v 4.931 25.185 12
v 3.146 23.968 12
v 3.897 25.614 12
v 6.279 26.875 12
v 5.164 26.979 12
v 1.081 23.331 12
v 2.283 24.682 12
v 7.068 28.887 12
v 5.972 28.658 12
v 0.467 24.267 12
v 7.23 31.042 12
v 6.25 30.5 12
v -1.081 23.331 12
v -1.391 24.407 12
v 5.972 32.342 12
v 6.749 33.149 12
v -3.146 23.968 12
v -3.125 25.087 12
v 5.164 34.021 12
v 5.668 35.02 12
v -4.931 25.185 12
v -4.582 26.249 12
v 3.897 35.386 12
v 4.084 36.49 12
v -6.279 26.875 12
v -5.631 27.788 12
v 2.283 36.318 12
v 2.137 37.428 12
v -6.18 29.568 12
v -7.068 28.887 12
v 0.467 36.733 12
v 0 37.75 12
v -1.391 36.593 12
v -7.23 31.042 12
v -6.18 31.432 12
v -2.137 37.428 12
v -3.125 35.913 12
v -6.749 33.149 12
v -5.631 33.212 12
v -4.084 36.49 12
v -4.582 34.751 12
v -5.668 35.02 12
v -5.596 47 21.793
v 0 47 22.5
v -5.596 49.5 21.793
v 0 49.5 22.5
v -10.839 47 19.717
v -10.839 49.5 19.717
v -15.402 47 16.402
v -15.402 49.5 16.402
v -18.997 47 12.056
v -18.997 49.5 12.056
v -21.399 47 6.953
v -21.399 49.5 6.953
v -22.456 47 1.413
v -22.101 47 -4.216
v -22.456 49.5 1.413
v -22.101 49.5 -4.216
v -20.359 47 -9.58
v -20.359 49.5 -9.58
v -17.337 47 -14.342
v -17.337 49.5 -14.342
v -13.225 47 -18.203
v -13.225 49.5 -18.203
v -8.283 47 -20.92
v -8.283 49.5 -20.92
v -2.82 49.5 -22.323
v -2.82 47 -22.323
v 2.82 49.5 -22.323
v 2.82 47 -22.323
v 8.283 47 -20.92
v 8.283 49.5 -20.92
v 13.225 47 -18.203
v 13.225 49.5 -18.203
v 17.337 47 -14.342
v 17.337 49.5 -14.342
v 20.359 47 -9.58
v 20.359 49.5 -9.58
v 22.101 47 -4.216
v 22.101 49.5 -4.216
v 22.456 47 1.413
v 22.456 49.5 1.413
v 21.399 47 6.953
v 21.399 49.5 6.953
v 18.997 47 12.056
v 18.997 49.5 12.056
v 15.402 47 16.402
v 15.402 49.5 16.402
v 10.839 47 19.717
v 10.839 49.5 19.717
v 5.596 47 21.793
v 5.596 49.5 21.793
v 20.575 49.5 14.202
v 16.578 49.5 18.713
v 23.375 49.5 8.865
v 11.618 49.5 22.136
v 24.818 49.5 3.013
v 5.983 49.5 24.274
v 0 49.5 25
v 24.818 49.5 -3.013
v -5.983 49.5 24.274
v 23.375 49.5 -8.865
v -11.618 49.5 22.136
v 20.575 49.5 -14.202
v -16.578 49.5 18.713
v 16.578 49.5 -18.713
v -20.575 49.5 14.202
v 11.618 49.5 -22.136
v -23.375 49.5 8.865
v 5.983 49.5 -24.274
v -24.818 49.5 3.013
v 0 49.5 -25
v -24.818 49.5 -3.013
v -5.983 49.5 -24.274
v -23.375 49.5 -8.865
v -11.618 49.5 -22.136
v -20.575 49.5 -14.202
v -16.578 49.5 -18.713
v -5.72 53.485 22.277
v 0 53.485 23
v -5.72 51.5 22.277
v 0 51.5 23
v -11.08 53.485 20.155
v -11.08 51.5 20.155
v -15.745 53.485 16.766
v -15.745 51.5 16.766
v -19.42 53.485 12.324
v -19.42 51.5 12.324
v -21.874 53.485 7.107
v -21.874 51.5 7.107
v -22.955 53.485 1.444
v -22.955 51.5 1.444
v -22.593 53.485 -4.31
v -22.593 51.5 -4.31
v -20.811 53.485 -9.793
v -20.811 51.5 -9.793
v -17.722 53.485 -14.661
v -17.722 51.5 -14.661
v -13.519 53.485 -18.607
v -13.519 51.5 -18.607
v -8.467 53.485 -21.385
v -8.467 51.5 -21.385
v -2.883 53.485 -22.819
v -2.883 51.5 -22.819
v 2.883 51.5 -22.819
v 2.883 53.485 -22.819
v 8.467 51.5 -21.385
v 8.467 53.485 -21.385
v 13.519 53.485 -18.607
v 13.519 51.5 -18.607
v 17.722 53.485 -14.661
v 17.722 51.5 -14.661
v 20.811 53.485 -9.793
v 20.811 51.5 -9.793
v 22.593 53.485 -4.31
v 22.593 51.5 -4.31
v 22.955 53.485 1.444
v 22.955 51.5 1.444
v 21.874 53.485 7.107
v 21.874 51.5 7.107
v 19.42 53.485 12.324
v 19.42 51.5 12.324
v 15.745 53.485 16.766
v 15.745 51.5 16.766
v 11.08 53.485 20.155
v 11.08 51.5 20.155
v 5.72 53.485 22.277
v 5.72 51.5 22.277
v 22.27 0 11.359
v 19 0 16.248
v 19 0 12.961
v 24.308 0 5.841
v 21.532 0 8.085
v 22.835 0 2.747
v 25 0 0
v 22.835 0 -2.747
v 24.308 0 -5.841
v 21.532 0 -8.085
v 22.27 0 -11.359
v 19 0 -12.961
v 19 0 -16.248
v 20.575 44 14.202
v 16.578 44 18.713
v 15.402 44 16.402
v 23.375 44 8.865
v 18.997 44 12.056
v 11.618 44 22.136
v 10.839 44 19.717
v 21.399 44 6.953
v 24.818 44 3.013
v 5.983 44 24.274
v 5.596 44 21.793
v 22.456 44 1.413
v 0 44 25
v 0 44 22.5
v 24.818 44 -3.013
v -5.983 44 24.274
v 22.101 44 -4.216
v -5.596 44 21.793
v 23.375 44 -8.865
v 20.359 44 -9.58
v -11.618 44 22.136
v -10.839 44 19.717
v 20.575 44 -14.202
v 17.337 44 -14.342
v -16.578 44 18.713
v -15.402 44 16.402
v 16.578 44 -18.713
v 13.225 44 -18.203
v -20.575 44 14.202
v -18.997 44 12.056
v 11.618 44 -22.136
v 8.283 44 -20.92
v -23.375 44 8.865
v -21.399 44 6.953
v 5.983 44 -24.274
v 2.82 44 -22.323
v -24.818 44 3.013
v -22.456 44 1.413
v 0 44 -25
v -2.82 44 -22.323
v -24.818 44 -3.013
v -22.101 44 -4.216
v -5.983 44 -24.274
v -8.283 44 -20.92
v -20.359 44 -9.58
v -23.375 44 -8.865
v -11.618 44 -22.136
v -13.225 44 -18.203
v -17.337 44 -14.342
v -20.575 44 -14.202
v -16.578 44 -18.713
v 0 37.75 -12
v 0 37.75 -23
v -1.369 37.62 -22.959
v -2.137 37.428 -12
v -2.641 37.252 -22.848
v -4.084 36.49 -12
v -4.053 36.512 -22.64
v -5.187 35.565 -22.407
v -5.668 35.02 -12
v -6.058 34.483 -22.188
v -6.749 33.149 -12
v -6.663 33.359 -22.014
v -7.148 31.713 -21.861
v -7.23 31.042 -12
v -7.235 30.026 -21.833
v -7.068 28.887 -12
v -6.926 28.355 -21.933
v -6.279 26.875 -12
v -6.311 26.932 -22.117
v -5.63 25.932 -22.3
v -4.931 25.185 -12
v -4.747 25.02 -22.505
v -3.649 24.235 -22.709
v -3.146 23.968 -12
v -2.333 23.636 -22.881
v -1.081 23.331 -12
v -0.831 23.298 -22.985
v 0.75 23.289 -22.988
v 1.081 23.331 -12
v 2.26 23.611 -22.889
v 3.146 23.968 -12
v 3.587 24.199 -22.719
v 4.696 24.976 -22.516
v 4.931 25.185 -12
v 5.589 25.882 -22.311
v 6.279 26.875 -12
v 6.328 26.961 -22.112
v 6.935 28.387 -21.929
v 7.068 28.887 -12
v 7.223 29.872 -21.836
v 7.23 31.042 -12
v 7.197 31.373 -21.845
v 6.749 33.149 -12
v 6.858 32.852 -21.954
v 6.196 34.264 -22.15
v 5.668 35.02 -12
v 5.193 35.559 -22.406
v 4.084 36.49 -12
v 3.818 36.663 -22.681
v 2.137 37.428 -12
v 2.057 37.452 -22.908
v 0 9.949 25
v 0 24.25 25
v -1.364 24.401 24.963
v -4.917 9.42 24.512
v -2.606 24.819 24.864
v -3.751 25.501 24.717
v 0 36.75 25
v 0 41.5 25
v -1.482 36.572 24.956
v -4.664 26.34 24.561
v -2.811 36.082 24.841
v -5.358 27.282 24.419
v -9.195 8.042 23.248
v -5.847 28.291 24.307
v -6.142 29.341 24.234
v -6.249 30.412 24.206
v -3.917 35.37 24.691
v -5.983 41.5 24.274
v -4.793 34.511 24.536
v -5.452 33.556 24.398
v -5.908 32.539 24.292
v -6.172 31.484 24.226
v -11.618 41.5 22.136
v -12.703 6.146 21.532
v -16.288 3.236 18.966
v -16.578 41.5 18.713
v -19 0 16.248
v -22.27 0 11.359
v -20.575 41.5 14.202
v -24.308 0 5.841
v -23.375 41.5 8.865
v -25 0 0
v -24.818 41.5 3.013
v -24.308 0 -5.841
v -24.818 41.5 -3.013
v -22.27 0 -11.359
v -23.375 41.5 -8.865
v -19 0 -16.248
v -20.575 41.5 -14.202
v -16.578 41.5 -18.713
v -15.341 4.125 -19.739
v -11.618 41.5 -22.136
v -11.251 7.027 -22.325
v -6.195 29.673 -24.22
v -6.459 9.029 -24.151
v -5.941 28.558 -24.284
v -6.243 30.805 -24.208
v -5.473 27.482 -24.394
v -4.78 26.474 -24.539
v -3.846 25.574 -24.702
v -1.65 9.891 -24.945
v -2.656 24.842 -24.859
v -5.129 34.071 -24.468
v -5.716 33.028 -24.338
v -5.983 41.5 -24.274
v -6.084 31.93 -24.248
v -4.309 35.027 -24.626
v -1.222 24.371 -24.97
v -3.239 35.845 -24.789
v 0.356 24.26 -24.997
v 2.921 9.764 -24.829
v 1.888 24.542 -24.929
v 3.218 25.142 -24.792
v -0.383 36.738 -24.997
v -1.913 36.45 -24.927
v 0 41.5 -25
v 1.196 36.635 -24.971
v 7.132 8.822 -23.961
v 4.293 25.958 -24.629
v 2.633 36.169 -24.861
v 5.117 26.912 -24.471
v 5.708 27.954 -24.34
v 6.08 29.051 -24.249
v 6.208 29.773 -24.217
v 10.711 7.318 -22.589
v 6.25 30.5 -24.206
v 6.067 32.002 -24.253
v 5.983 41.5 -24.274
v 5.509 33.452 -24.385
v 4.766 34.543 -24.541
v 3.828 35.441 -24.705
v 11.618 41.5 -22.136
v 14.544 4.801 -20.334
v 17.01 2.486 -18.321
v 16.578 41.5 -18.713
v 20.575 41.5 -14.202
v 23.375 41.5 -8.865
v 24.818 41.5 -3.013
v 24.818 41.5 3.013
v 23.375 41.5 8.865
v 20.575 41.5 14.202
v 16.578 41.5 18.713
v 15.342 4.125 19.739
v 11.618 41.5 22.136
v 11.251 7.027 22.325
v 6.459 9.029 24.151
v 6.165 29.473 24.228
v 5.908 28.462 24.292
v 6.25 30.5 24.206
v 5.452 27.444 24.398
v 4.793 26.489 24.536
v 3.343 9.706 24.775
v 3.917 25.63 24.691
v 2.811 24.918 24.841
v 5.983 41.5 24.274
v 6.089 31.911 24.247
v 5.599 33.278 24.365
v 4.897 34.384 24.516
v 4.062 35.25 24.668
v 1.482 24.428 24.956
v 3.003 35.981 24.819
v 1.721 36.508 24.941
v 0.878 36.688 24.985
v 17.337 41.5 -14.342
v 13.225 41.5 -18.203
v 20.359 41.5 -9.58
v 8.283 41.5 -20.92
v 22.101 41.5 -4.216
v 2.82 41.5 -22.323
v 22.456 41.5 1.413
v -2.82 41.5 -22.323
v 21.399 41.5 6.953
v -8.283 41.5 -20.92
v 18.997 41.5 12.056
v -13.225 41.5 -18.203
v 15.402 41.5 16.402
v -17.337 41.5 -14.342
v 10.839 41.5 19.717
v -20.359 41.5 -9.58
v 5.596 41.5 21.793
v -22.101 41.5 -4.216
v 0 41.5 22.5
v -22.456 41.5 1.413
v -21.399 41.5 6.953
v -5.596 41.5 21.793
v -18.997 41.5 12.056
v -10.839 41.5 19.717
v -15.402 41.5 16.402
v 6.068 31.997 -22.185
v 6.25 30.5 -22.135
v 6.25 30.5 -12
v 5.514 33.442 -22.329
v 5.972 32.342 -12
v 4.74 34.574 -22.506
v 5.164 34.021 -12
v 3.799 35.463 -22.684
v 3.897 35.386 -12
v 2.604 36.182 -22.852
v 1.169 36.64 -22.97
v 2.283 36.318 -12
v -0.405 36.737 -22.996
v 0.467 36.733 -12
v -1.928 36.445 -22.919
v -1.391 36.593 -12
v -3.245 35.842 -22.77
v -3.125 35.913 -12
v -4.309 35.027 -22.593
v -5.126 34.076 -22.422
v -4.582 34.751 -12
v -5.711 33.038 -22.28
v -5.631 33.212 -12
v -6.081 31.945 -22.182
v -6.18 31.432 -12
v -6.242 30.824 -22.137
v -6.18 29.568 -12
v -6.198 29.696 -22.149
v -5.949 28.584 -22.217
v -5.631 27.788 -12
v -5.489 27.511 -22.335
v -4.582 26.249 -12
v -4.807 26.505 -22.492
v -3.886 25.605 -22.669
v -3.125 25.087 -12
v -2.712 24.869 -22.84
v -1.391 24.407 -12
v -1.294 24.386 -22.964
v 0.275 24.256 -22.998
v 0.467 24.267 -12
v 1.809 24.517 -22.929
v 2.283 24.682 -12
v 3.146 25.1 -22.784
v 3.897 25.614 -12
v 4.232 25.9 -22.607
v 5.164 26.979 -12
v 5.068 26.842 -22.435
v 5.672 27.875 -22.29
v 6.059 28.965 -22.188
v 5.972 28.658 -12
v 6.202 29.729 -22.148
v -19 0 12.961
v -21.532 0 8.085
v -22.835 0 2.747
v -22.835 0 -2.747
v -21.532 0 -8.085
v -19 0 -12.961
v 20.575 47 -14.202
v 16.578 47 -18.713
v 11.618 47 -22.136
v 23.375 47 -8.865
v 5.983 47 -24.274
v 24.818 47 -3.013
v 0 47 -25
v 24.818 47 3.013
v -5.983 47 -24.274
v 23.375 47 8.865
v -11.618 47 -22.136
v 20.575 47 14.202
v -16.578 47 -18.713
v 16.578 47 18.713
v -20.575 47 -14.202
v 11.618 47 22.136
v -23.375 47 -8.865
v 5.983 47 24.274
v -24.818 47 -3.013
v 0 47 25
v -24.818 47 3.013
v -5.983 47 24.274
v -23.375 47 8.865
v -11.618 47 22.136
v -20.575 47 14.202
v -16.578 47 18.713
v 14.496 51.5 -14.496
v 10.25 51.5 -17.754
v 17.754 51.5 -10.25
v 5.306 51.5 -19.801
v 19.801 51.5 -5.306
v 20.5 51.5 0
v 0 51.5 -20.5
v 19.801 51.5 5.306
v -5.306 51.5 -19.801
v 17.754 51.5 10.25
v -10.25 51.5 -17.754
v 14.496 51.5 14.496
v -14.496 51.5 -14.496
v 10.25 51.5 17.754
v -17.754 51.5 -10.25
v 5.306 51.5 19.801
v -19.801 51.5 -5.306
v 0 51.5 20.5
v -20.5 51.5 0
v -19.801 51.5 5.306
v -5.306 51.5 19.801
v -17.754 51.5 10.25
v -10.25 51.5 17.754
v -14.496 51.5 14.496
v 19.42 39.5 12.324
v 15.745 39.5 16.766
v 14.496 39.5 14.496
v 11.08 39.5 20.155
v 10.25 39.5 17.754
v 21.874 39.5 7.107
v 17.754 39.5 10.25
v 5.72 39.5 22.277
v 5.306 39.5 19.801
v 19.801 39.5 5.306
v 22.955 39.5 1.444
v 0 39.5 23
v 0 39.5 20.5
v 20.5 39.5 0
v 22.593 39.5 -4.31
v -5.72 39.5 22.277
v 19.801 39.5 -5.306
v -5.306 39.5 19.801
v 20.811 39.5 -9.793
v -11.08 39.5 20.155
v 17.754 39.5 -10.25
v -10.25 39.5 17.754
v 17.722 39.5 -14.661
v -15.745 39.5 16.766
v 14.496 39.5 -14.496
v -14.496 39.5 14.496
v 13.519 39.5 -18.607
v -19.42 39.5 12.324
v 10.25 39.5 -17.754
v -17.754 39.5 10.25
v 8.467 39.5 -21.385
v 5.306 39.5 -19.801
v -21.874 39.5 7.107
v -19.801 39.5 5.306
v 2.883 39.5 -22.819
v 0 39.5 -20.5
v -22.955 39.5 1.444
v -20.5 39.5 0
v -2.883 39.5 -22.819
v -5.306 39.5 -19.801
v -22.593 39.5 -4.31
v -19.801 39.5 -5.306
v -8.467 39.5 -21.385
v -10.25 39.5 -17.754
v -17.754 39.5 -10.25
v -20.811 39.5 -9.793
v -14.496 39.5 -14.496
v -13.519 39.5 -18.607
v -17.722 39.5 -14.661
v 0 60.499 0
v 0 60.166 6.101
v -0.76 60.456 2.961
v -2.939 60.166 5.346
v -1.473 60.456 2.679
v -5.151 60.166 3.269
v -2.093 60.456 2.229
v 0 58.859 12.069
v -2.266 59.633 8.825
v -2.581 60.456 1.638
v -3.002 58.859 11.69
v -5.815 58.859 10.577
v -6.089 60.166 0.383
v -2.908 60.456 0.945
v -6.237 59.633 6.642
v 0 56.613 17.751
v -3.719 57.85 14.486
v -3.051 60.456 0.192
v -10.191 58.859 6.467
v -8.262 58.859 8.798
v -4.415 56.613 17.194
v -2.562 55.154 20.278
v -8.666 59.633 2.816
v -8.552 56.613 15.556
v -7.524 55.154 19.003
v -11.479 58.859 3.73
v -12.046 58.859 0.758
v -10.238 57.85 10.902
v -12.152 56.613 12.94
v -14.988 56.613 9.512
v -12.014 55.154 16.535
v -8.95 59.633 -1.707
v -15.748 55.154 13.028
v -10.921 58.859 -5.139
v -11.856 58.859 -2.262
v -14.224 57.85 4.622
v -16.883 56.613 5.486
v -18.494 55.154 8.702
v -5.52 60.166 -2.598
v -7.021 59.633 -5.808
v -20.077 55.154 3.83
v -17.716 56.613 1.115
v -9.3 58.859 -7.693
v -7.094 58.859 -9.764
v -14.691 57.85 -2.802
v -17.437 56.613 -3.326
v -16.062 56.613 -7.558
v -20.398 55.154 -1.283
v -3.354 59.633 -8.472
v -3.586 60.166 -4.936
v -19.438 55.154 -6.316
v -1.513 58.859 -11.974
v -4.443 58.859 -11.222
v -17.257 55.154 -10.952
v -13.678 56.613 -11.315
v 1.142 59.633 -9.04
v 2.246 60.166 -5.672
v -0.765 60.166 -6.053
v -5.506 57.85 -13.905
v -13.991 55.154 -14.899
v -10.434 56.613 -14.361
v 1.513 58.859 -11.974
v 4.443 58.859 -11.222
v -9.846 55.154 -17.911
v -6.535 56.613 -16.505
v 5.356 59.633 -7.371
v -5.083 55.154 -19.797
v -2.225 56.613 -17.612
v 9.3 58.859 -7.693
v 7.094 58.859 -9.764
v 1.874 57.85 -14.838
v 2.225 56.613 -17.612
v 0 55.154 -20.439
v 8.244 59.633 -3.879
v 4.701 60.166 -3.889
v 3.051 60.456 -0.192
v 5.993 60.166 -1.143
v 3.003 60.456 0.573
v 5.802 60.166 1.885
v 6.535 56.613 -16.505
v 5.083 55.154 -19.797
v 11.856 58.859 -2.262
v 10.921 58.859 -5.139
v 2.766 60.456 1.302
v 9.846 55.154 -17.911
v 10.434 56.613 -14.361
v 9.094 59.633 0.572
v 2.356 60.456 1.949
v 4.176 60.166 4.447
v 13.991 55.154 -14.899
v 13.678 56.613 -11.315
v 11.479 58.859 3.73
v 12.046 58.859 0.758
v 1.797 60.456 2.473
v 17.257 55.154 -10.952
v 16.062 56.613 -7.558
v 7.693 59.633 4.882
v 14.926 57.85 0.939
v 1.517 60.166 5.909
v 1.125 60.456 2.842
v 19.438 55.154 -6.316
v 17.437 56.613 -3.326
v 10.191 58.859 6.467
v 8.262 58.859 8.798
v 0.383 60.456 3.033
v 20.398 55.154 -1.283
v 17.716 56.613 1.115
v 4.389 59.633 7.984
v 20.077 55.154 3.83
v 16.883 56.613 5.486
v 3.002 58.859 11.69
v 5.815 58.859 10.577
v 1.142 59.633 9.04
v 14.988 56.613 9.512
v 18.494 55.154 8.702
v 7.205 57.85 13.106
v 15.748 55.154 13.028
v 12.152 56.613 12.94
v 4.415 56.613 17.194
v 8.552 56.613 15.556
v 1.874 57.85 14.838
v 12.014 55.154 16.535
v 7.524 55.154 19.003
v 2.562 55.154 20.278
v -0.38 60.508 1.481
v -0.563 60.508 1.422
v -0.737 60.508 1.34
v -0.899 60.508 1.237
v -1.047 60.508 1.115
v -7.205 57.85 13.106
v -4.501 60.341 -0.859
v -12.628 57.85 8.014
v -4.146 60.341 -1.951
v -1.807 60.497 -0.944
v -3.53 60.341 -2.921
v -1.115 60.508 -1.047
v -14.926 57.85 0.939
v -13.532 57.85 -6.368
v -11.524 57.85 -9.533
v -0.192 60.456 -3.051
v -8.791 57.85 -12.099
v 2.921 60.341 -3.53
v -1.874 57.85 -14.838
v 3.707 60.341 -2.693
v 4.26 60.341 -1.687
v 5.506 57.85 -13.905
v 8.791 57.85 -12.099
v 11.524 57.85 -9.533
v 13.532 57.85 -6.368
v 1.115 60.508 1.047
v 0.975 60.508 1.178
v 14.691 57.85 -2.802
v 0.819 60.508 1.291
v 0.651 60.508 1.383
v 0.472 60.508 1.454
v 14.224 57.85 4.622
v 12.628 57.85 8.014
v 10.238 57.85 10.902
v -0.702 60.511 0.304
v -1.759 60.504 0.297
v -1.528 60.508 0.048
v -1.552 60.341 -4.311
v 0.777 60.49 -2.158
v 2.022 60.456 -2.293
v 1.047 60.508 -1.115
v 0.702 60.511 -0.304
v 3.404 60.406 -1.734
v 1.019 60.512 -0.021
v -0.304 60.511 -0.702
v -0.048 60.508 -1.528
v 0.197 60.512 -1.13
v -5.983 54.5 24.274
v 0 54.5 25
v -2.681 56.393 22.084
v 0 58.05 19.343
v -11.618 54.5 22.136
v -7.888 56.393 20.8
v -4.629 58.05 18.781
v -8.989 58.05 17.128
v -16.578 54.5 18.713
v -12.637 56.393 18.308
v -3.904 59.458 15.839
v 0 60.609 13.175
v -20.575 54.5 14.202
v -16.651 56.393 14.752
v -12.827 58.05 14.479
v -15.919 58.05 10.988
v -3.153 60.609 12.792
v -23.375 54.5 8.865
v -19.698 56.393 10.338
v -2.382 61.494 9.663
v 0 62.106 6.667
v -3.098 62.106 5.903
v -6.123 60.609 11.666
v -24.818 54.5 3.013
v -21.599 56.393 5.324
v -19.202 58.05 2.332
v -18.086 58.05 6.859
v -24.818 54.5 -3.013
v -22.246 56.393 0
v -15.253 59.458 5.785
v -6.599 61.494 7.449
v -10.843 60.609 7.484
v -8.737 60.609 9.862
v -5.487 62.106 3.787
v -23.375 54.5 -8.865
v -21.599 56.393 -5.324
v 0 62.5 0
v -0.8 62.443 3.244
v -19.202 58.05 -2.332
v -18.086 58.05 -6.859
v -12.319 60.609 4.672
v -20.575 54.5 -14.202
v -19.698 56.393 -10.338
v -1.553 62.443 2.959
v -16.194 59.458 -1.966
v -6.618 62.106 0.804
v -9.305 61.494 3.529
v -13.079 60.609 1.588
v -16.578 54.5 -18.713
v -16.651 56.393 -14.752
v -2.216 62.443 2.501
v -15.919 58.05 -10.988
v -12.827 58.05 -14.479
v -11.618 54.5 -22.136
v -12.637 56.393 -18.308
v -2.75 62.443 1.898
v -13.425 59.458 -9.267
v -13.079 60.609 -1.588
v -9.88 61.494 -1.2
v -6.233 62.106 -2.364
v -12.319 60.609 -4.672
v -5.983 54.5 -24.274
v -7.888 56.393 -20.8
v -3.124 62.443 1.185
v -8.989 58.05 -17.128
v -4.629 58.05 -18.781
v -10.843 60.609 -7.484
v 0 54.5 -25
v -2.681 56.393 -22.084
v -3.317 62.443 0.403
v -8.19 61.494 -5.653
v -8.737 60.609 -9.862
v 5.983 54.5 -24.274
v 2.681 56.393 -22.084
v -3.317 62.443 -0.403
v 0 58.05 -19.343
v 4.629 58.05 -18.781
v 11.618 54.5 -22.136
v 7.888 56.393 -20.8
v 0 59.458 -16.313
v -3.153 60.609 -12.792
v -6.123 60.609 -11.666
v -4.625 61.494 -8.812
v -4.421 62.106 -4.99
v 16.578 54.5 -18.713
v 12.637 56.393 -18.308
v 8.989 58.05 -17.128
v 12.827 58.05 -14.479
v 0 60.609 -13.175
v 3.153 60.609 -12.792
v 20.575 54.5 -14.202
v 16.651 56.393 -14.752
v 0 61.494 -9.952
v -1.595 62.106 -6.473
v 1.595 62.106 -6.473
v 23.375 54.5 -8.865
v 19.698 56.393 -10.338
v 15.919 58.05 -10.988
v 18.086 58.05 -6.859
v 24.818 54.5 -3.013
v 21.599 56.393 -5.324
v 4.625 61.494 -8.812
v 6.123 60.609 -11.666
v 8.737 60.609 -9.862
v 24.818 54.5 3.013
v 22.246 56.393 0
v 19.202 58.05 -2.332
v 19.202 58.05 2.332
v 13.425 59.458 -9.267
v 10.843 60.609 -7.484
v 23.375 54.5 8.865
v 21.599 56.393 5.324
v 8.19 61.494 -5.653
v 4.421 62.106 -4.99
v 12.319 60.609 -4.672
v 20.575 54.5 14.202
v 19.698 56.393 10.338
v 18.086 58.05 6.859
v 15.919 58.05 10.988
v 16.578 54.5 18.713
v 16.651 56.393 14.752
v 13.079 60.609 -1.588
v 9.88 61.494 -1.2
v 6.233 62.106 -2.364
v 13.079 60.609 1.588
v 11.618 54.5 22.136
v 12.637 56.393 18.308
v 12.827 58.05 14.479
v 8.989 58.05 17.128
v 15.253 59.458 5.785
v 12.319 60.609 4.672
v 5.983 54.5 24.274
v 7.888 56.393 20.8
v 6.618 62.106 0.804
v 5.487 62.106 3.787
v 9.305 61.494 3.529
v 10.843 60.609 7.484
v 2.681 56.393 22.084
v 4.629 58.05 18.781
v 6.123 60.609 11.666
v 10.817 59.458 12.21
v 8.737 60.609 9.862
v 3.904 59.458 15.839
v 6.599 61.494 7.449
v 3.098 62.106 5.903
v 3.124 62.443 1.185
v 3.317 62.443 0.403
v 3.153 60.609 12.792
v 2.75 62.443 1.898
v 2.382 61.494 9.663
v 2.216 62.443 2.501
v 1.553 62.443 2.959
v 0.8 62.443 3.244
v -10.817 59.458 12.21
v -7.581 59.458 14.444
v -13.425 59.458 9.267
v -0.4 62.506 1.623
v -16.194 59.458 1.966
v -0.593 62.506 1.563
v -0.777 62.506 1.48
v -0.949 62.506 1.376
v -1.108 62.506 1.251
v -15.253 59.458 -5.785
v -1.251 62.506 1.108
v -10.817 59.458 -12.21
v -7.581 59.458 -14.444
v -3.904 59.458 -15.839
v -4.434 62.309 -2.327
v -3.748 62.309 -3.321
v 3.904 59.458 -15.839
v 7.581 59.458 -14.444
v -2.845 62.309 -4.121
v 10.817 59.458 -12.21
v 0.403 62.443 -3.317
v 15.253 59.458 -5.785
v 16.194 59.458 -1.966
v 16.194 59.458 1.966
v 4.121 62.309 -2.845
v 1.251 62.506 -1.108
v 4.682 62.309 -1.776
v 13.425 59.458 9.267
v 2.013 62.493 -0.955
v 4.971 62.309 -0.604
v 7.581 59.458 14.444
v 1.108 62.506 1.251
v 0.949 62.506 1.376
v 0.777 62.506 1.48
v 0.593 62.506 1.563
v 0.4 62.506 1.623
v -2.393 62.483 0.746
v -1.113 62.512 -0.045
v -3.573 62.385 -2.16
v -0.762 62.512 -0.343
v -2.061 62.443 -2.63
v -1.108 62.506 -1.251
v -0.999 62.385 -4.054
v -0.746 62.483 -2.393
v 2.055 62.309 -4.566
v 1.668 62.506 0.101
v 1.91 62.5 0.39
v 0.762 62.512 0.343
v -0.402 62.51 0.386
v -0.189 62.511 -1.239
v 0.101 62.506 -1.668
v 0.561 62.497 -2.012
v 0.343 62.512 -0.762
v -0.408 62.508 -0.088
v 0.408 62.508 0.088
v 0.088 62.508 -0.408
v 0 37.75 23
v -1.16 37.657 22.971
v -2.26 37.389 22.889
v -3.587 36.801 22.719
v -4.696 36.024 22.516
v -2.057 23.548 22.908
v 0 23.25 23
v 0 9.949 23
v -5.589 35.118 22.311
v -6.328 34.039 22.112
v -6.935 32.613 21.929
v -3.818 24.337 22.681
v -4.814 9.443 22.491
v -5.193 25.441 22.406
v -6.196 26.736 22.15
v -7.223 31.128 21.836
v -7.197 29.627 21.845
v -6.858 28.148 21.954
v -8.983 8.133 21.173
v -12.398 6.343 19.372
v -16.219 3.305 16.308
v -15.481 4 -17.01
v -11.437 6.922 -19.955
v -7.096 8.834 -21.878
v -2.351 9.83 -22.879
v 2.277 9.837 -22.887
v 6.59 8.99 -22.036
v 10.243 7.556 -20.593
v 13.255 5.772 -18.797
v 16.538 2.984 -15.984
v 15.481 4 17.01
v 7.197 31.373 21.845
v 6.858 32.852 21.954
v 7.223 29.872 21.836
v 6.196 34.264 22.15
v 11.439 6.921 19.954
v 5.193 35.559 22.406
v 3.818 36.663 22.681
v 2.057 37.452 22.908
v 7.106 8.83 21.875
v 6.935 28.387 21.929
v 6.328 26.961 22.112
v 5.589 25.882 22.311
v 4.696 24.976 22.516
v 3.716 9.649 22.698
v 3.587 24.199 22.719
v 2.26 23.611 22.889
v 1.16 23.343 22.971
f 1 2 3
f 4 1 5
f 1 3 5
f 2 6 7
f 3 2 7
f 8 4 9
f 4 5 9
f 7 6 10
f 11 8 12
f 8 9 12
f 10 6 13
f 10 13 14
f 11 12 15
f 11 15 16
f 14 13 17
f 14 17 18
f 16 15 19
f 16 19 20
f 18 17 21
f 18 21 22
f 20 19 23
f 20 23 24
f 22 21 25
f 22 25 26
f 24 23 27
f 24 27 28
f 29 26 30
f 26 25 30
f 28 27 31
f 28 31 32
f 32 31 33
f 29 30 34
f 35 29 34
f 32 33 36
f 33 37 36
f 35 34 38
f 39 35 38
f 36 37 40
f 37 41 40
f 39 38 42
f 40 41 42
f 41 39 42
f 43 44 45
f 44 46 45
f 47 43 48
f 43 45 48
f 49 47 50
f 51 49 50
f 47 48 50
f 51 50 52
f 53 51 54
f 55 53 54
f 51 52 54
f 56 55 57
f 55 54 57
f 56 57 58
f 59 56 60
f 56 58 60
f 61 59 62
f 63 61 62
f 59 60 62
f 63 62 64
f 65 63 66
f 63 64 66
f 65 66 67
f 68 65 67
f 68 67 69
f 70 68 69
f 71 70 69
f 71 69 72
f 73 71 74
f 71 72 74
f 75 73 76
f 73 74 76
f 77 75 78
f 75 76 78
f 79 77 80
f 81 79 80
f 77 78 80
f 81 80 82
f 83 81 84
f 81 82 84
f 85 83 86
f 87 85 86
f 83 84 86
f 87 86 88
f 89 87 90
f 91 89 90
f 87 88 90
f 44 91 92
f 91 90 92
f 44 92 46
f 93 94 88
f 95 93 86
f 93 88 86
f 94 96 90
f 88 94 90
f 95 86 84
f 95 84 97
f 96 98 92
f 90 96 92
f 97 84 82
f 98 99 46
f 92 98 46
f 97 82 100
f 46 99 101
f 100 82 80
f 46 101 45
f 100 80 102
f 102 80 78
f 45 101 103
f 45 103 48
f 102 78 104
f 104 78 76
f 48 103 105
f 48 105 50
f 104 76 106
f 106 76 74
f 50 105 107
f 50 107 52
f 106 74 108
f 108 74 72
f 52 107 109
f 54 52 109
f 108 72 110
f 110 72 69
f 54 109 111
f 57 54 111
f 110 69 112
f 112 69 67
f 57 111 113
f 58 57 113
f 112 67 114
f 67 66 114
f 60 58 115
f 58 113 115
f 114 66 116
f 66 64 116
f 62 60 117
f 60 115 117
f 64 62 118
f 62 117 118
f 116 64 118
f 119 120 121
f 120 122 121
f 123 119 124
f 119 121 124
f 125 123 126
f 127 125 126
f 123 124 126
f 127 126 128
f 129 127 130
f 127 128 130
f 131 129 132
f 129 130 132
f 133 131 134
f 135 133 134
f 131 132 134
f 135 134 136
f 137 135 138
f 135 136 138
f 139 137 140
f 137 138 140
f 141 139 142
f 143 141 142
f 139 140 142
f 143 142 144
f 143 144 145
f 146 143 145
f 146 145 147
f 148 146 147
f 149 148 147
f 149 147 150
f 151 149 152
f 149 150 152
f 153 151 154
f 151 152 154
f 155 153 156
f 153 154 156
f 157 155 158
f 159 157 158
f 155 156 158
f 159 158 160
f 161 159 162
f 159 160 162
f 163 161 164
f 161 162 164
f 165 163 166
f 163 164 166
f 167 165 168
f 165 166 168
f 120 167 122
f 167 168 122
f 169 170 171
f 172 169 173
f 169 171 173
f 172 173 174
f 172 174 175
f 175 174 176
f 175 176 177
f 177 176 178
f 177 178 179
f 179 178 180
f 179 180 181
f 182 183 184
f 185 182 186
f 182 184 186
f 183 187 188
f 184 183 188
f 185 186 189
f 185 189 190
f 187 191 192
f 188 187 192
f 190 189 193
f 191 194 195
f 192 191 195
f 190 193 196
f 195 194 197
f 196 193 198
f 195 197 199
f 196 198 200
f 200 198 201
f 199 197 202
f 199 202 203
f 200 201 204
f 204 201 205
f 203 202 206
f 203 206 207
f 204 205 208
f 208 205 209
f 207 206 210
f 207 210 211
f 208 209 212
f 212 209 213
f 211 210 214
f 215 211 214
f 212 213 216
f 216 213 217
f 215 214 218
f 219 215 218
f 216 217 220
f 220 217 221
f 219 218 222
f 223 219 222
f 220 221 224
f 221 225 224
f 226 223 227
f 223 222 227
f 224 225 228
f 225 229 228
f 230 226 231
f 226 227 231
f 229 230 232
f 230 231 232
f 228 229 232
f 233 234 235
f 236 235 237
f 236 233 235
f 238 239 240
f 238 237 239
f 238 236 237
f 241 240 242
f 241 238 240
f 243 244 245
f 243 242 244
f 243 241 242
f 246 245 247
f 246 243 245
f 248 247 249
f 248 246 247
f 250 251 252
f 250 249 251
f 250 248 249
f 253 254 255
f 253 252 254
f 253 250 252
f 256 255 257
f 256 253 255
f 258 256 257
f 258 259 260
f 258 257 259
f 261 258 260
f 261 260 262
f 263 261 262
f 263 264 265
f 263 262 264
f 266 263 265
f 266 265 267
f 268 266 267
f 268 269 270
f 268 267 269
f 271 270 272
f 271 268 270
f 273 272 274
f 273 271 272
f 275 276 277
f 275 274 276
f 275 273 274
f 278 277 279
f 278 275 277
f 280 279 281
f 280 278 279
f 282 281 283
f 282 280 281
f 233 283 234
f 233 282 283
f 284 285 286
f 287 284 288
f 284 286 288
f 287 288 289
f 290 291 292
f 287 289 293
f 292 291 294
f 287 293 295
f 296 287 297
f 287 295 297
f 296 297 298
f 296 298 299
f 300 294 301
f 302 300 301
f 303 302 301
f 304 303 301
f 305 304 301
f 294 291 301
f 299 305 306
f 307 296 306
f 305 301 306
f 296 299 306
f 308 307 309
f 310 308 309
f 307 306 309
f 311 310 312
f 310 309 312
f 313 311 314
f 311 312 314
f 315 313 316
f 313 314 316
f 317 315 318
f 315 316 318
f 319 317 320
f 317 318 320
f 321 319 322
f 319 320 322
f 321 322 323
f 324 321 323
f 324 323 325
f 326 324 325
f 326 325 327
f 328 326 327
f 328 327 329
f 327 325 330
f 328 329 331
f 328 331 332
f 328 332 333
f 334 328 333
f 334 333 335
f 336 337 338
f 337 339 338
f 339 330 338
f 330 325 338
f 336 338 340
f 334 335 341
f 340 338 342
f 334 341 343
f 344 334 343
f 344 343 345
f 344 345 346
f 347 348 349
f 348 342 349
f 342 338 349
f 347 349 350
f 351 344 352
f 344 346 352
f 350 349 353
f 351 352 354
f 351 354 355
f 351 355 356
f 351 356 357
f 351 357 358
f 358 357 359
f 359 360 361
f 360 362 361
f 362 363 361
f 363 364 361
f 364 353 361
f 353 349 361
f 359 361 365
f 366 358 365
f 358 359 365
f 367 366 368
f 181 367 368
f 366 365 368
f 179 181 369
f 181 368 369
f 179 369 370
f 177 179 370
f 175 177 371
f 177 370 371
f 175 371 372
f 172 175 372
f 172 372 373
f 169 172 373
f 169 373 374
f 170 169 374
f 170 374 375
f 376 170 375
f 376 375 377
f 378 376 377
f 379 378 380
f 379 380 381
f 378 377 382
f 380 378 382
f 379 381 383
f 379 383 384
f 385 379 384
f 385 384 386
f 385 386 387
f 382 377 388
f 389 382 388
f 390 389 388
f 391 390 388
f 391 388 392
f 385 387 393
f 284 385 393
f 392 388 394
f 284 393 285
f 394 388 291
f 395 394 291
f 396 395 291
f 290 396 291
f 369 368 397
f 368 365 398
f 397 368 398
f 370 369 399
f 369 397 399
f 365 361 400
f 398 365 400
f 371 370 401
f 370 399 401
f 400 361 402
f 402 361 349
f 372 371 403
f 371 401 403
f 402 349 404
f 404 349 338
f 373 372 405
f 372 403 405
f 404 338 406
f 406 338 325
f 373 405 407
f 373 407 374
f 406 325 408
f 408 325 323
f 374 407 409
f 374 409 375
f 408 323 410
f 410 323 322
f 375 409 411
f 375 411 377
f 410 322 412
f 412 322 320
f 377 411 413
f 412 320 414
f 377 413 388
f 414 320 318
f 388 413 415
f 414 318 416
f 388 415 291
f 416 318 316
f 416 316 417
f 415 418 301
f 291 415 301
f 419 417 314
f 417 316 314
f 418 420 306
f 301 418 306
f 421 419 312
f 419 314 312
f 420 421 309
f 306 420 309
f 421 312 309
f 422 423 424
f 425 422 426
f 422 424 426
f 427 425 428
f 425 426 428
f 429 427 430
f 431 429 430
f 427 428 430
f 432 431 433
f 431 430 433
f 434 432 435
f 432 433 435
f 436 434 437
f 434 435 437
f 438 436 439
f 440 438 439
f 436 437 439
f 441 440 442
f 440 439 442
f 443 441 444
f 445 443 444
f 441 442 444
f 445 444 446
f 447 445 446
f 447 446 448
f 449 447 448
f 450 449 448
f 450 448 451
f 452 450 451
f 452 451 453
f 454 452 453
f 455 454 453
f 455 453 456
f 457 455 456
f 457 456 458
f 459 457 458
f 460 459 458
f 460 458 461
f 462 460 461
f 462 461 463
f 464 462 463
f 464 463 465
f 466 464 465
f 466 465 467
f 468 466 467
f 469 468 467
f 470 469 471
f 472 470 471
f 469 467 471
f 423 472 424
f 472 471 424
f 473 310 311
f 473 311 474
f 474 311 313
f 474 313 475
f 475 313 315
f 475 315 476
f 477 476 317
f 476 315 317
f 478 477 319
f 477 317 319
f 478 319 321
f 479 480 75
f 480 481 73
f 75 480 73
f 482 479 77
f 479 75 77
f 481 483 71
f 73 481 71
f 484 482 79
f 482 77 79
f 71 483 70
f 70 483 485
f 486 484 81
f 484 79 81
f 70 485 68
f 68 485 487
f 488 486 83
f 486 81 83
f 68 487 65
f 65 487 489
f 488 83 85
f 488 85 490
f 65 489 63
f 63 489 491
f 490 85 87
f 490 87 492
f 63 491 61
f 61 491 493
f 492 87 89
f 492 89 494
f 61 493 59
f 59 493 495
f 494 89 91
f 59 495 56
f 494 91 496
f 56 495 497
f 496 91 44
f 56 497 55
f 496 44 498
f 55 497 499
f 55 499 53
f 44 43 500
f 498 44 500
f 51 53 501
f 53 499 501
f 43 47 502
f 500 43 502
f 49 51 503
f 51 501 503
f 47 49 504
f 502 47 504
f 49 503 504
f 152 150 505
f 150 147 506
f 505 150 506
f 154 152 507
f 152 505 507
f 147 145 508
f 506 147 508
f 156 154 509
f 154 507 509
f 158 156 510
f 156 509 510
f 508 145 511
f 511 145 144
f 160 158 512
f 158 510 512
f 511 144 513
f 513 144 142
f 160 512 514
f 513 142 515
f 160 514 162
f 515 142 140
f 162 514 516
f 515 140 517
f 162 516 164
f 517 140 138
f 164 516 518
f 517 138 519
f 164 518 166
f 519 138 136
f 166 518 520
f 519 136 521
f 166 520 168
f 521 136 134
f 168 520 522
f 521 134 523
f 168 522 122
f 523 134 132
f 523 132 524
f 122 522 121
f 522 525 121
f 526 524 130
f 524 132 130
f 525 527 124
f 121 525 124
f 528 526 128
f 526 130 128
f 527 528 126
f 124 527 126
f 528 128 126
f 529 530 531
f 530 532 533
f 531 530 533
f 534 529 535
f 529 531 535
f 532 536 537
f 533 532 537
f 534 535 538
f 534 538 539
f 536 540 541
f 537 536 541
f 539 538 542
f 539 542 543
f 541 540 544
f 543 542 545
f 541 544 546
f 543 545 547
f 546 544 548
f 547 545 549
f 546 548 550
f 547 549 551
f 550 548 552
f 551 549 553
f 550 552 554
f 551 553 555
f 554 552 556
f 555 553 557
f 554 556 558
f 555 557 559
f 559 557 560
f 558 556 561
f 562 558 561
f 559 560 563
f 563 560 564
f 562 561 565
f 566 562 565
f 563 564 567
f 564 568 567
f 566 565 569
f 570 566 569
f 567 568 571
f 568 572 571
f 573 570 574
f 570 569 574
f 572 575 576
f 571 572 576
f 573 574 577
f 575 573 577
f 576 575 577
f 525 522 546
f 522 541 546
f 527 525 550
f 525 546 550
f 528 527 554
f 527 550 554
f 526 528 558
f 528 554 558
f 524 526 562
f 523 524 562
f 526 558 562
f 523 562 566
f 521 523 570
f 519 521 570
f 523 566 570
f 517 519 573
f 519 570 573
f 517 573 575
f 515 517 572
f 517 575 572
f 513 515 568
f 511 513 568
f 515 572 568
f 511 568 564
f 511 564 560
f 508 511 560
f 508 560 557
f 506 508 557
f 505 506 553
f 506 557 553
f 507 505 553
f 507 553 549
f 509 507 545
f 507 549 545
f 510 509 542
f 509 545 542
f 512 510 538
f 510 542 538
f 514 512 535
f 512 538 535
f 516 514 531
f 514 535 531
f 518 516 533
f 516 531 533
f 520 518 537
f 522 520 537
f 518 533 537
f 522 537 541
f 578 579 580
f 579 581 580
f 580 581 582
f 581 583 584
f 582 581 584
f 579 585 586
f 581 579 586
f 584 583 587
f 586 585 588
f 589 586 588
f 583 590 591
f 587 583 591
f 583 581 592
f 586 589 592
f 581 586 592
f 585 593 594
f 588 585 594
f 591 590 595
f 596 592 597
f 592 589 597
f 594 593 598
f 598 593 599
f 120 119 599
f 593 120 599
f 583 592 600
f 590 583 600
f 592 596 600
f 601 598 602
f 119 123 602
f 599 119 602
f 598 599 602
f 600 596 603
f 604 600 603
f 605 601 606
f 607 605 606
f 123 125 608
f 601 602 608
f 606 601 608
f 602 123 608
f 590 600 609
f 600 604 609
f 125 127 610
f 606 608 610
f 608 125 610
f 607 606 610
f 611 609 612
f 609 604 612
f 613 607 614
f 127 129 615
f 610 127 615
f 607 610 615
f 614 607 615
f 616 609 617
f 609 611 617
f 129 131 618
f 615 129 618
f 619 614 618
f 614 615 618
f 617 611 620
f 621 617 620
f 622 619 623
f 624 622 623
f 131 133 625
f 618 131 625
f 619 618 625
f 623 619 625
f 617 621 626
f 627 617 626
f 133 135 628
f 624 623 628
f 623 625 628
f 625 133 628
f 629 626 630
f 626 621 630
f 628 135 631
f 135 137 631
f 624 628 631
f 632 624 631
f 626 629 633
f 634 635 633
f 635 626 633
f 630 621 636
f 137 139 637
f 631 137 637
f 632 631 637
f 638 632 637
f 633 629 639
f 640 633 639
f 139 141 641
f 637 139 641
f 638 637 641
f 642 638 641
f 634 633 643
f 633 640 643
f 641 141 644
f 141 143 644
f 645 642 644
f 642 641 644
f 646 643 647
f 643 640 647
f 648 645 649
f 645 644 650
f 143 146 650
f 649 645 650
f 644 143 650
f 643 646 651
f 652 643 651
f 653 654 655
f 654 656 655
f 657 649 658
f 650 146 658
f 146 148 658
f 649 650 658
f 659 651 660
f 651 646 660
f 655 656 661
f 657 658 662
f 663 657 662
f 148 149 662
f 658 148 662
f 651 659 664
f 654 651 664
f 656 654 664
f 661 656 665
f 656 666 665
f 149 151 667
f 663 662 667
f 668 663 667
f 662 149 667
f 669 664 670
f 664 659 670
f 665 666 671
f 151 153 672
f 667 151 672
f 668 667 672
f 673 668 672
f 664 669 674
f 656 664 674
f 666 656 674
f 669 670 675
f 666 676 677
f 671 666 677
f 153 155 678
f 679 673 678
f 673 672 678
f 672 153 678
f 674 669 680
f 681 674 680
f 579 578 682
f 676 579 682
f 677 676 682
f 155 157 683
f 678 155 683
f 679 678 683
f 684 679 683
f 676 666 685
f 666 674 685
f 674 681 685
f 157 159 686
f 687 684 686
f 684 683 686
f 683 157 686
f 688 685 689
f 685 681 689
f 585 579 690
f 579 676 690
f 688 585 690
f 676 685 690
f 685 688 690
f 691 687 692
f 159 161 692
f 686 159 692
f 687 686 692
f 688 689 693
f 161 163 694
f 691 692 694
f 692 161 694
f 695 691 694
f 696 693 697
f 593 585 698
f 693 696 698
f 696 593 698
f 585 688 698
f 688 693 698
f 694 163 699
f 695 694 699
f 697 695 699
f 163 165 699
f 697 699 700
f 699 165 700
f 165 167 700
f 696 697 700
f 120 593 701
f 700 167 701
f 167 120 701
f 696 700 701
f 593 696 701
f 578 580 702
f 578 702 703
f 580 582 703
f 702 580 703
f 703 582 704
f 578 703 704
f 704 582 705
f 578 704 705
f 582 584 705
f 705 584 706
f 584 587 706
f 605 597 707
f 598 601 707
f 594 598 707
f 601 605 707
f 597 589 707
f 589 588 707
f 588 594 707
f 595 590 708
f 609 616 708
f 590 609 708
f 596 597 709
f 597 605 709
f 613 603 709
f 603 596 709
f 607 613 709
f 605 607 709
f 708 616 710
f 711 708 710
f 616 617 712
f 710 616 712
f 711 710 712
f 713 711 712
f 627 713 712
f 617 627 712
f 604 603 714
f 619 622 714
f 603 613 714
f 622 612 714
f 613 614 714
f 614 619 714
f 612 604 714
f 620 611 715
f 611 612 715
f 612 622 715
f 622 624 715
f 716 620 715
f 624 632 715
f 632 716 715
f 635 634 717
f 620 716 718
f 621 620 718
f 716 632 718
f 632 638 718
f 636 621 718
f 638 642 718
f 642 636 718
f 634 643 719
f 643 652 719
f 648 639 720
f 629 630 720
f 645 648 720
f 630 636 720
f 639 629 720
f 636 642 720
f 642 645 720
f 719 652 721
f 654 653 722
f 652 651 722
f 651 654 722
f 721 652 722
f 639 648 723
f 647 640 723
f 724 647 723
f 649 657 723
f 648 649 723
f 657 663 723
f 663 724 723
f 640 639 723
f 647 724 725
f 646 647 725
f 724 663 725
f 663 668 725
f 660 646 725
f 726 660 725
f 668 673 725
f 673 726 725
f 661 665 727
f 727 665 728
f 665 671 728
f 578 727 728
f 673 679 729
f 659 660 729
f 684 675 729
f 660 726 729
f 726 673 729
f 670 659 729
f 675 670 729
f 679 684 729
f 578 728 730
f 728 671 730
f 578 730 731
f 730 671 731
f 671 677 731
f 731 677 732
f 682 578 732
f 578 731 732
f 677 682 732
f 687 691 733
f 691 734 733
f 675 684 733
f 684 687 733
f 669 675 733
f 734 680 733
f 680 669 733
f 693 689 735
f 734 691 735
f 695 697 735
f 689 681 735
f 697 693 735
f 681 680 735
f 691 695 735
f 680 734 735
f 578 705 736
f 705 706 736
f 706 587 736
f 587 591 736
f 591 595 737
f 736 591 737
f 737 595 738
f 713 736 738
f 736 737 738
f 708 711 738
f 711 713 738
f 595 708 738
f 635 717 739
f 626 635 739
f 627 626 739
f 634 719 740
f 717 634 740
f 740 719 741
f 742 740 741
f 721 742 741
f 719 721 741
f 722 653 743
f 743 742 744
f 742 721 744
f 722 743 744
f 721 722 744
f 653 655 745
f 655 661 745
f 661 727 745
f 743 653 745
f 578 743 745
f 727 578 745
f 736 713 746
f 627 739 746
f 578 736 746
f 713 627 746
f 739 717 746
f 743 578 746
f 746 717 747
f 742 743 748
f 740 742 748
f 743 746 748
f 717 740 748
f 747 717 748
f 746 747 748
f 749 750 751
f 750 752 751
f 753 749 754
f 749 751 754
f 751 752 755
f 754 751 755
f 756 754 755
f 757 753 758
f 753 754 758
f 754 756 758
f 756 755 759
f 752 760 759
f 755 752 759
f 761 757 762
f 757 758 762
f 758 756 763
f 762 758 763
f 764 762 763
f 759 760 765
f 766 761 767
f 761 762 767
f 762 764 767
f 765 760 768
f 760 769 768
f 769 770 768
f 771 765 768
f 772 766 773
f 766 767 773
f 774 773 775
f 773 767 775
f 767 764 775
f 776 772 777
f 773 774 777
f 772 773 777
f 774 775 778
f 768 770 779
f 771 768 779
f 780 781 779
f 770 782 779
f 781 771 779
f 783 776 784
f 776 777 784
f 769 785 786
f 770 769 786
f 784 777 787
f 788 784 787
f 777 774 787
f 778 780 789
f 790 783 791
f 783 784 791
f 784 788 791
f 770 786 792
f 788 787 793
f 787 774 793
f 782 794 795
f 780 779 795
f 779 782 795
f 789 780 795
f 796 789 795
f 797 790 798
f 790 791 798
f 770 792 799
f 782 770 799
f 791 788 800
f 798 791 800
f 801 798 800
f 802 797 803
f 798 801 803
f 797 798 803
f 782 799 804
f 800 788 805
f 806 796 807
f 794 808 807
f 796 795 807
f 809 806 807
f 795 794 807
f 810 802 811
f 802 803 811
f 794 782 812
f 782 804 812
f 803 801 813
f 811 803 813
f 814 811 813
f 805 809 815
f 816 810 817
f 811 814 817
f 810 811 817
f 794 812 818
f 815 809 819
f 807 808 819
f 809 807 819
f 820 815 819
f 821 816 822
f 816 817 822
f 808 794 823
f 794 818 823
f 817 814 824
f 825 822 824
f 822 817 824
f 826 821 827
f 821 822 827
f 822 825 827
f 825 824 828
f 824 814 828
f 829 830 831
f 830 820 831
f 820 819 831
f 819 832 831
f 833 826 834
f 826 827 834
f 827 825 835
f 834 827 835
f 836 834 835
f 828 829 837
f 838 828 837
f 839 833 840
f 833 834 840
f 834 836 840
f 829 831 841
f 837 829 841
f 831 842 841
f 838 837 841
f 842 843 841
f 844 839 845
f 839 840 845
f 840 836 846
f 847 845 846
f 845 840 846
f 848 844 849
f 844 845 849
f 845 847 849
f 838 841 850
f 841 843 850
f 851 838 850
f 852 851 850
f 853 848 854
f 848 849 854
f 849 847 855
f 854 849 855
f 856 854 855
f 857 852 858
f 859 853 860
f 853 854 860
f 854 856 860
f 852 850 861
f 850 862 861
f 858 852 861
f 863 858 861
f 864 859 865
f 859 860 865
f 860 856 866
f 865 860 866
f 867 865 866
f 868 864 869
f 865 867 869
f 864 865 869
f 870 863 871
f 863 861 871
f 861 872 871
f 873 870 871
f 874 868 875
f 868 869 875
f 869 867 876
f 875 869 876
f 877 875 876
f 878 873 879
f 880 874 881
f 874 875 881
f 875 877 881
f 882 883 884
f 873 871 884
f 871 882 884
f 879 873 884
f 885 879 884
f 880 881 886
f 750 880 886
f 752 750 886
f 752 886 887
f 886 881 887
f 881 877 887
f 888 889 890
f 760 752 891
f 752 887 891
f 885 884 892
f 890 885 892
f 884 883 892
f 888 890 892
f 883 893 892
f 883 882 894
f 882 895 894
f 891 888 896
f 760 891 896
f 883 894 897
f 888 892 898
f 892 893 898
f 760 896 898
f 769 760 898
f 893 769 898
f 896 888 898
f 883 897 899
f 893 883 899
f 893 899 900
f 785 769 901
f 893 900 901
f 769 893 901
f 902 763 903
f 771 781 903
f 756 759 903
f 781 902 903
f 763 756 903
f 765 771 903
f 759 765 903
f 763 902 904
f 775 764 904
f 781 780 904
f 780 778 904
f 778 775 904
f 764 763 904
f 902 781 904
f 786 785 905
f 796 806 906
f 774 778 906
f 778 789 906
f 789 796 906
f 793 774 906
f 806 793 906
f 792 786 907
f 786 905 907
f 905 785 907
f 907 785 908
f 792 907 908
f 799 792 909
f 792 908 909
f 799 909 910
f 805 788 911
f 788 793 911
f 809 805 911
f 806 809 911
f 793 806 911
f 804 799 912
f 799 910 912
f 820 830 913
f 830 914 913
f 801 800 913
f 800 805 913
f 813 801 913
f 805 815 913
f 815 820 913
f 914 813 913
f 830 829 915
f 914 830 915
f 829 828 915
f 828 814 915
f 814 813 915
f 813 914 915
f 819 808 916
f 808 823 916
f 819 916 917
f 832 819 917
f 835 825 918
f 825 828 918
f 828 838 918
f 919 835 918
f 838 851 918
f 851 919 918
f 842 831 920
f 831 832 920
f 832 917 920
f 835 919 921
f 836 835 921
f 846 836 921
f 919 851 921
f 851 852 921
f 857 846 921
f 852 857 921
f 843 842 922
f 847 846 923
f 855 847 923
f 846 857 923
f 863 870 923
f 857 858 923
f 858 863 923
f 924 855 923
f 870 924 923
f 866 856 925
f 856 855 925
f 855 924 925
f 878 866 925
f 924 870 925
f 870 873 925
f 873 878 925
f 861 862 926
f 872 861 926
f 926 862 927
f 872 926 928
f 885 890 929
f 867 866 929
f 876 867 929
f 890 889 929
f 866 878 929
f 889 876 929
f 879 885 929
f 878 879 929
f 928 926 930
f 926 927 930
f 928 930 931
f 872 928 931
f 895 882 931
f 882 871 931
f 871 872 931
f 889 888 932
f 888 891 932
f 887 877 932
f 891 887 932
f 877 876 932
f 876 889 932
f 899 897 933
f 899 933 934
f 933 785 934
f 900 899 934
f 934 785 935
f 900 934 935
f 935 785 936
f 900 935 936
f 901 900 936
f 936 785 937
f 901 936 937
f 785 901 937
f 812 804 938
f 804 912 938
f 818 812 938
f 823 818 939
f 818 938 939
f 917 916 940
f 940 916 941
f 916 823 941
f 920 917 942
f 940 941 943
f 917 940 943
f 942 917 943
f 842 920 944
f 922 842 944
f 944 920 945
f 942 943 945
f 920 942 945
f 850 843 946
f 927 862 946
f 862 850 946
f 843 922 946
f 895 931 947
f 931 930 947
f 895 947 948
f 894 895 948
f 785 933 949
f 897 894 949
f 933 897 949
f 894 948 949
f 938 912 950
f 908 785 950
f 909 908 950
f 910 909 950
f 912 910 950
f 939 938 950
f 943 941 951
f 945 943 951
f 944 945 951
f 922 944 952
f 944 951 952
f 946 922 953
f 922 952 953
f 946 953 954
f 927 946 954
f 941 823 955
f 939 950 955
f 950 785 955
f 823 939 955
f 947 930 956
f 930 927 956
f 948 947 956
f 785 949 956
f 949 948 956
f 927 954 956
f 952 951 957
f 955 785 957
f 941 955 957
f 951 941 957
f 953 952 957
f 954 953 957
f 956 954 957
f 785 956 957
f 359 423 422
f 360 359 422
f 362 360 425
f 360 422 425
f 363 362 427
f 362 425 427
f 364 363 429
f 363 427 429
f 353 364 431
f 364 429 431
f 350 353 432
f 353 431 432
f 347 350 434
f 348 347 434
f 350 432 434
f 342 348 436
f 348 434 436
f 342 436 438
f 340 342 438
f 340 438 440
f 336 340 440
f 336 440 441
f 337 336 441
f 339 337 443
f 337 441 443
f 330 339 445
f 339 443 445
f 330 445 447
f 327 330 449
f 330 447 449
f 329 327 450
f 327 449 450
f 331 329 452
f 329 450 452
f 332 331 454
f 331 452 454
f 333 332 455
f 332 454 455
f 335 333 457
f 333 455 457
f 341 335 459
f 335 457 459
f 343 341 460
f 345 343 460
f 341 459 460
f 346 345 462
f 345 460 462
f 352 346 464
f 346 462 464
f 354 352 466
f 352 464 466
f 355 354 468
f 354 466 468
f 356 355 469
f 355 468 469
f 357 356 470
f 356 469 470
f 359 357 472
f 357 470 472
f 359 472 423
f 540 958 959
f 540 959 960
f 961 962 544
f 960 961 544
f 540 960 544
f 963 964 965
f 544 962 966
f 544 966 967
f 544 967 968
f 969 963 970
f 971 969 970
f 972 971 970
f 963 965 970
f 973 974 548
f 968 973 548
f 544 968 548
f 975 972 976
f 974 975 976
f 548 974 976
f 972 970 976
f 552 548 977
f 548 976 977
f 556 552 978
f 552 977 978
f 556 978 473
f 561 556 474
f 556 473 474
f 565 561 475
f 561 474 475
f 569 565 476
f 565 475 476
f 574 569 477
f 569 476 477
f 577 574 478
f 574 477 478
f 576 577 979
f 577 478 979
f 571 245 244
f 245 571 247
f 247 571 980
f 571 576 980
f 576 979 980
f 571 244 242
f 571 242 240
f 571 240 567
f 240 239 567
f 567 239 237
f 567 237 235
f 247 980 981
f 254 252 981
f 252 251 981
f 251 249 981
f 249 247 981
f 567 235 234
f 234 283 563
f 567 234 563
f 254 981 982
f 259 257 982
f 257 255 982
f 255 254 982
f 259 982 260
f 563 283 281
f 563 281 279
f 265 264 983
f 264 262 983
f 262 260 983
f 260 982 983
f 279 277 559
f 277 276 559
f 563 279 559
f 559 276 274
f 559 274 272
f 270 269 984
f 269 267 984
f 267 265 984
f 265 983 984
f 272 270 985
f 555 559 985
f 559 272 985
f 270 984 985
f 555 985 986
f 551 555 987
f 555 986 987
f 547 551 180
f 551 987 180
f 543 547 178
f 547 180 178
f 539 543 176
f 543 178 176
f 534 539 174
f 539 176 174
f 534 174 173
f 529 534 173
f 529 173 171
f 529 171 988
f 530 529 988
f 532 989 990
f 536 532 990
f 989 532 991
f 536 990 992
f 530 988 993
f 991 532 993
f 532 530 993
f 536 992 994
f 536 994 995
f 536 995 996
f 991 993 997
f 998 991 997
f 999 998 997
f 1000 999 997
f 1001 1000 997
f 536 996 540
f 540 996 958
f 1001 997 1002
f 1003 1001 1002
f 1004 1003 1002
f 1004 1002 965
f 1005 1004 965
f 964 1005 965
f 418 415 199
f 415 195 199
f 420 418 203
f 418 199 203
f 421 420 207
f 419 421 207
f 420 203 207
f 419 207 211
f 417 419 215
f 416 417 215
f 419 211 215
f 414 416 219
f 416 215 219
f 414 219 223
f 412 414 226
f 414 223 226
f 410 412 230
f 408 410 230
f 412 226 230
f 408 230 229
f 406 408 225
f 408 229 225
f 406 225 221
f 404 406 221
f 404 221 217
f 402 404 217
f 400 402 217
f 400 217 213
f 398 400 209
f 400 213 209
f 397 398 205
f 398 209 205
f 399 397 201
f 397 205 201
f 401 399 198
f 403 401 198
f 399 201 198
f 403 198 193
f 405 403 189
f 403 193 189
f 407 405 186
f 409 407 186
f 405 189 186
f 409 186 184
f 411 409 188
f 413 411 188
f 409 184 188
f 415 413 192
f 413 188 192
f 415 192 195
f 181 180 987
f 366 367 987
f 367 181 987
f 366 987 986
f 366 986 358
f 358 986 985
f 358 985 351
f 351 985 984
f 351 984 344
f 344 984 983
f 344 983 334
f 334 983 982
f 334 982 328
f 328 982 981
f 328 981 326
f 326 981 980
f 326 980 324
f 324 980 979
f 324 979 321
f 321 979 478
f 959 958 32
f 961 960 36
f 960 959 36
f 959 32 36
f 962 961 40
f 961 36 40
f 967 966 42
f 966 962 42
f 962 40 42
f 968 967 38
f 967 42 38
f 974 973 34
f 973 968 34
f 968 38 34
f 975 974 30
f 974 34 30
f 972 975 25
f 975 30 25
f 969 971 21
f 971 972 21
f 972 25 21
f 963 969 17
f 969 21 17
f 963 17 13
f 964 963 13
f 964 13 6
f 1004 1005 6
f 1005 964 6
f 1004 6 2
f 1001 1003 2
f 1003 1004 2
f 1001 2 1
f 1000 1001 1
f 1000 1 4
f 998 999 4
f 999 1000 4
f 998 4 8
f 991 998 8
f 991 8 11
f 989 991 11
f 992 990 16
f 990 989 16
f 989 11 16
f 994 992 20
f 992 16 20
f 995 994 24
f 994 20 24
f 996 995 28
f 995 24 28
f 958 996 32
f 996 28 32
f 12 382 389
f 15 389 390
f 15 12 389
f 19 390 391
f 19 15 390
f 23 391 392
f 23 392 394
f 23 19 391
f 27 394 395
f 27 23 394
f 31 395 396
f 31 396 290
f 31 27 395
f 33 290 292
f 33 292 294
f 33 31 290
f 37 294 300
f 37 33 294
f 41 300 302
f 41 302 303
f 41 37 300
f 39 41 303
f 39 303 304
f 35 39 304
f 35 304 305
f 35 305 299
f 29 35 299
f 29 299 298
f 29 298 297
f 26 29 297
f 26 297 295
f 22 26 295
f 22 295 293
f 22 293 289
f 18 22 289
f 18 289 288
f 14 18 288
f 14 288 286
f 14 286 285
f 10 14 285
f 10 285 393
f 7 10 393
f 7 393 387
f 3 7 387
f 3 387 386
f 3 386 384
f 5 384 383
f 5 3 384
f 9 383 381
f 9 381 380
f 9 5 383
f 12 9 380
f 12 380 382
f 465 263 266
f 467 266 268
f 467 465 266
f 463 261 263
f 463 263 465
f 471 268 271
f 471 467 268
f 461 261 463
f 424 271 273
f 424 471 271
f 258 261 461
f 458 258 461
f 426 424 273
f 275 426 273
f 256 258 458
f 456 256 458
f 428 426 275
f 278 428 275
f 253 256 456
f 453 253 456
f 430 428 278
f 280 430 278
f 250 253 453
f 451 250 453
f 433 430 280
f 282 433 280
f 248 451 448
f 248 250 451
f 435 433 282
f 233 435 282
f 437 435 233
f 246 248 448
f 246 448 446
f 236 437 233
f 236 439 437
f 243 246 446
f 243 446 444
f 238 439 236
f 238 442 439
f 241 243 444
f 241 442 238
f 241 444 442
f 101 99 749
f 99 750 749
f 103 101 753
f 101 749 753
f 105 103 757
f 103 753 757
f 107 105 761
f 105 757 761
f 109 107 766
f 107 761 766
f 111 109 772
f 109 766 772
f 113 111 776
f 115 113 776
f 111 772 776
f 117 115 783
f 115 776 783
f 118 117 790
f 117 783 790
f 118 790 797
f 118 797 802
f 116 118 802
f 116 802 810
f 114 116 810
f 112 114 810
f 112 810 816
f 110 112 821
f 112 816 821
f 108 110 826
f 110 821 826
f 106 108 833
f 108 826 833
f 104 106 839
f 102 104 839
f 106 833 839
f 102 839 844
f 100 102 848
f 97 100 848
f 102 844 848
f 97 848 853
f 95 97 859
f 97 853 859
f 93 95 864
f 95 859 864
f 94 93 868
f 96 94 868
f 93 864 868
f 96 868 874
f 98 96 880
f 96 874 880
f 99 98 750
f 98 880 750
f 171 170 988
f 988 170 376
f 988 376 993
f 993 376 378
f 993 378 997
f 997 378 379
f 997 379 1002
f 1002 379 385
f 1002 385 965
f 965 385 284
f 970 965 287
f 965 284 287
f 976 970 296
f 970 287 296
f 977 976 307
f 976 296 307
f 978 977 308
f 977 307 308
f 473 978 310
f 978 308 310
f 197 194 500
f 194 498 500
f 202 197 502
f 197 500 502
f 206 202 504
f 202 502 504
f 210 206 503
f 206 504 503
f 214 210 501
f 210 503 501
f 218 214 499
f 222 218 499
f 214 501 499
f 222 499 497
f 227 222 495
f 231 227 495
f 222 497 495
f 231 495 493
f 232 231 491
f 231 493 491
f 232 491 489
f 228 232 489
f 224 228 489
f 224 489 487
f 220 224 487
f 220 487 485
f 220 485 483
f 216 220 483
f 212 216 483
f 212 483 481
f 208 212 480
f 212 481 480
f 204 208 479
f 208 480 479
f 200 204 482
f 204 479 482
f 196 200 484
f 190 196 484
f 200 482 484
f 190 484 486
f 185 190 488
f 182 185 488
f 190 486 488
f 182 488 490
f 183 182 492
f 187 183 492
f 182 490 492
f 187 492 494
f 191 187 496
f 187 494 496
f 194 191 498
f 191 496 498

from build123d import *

# Parameters (mm, degrees)
CUT_EXTRUDE1_DEPTH       = 70
SKETCH3_R                = 6.25
CUT_EXTRUDE2_DEPTH       = 70
BOSS_EXTRUDE2_REACH      = 78.823
BOSS_EXTRUDE2_END_RADIUS = 23
SKETCH4_R                = 7.25
SKETCH4_R_2              = 6.25


with BuildPart() as part:
    # Sketch1 → Revolve1 (revolve)
    with BuildSketch(Plane.XY, mode=Mode.PRIVATE) as revolve1_sk:
        with BuildLine():
            Line((0, 62.5), (0, 60.49936285))
            ThreePointArc((0, 60.49936285), (12.069492637, 58.859165445), (23, 53.484511145))
            Line((23, 53.484511145), (23, 51.5))
            Line((23, 51.5), (20.5, 51.5))
            Line((20.5, 51.5), (20.5, 45.5))
            Line((20.5, 45.5), (20.5, 39.5))
            Line((20.5, 39.5), (23, 39.5))
            Line((23, 39.5), (23, 0))
            Line((23, 0), (25, 0))
            Line((25, 0), (25, 41.5))
            Line((25, 41.5), (22.5, 41.5))
            Line((22.5, 41.5), (22.5, 44))
            Line((22.5, 44), (25, 44))
            Line((25, 44), (25, 47))
            Line((25, 47), (22.5, 47))
            Line((22.5, 47), (22.5, 49.5))
            Line((22.5, 49.5), (25, 49.5))
            Line((25, 49.5), (25, 54.5))
            ThreePointArc((25, 54.5), (13.174901691, 60.609067785), (0, 62.5))
        make_face()
    revolve(revolve1_sk.sketch.rotate(Axis((0, 62.5, 0), (0, -1, 0)), 90), axis=Axis((0, 62.5, 0), (0, -1, 0)))

    # Sketch2 → Cut-Extrude1 (cut, symmetric)
    with BuildSketch(Plane.XY):
        with BuildLine():
            Line((-19, 0), (19, 0))
            ThreePointArc((19, 0), (0, 9.949493307), (-19, 0))
        make_face()
    extrude(amount=CUT_EXTRUDE1_DEPTH, both=True, mode=Mode.SUBTRACT)

    # Sketch3 → Cut-Extrude2 (cut, symmetric)
    with BuildSketch(Plane.XY):
        with Locations((0, 30.5)):
            Circle(SKETCH3_R)
    extrude(amount=CUT_EXTRUDE2_DEPTH, both=True, mode=Mode.SUBTRACT)

    # Boss-Extrude2: up to this cylinder (the profile starts inside it)
    boss_extrude2_end = Plane(origin=(0, 23.455061, 0), z_dir=(0, 1, 0)) * Cylinder(BOSS_EXTRUDE2_END_RADIUS, 204.646, mode=Mode.PRIVATE)
    # Sketch4 → Boss-Extrude2 (add, up to the surface)
    with BuildSketch(Plane.XY.offset(12), mode=Mode.PRIVATE) as boss_extrude2_sk1:
        with Locations(Location((0, 30.5, 0), (0, 0, 90))):
            Circle(SKETCH4_R)
        with Locations((0, 30.5)):
            Circle(SKETCH4_R_2, mode=Mode.SUBTRACT)
    boss_extrude2_tool1 = extrude(boss_extrude2_sk1.sketch, amount=BOSS_EXTRUDE2_REACH, mode=Mode.PRIVATE) & boss_extrude2_end
    boss_extrude2 = boss_extrude2_tool1.solids().sort_by_distance((0, 23.455061, 12))[0]
    add(boss_extrude2)

    # Mirror1: Boss-Extrude2 across plane
    add(boss_extrude2.mirror(Plane.XY))


solid = part.part
